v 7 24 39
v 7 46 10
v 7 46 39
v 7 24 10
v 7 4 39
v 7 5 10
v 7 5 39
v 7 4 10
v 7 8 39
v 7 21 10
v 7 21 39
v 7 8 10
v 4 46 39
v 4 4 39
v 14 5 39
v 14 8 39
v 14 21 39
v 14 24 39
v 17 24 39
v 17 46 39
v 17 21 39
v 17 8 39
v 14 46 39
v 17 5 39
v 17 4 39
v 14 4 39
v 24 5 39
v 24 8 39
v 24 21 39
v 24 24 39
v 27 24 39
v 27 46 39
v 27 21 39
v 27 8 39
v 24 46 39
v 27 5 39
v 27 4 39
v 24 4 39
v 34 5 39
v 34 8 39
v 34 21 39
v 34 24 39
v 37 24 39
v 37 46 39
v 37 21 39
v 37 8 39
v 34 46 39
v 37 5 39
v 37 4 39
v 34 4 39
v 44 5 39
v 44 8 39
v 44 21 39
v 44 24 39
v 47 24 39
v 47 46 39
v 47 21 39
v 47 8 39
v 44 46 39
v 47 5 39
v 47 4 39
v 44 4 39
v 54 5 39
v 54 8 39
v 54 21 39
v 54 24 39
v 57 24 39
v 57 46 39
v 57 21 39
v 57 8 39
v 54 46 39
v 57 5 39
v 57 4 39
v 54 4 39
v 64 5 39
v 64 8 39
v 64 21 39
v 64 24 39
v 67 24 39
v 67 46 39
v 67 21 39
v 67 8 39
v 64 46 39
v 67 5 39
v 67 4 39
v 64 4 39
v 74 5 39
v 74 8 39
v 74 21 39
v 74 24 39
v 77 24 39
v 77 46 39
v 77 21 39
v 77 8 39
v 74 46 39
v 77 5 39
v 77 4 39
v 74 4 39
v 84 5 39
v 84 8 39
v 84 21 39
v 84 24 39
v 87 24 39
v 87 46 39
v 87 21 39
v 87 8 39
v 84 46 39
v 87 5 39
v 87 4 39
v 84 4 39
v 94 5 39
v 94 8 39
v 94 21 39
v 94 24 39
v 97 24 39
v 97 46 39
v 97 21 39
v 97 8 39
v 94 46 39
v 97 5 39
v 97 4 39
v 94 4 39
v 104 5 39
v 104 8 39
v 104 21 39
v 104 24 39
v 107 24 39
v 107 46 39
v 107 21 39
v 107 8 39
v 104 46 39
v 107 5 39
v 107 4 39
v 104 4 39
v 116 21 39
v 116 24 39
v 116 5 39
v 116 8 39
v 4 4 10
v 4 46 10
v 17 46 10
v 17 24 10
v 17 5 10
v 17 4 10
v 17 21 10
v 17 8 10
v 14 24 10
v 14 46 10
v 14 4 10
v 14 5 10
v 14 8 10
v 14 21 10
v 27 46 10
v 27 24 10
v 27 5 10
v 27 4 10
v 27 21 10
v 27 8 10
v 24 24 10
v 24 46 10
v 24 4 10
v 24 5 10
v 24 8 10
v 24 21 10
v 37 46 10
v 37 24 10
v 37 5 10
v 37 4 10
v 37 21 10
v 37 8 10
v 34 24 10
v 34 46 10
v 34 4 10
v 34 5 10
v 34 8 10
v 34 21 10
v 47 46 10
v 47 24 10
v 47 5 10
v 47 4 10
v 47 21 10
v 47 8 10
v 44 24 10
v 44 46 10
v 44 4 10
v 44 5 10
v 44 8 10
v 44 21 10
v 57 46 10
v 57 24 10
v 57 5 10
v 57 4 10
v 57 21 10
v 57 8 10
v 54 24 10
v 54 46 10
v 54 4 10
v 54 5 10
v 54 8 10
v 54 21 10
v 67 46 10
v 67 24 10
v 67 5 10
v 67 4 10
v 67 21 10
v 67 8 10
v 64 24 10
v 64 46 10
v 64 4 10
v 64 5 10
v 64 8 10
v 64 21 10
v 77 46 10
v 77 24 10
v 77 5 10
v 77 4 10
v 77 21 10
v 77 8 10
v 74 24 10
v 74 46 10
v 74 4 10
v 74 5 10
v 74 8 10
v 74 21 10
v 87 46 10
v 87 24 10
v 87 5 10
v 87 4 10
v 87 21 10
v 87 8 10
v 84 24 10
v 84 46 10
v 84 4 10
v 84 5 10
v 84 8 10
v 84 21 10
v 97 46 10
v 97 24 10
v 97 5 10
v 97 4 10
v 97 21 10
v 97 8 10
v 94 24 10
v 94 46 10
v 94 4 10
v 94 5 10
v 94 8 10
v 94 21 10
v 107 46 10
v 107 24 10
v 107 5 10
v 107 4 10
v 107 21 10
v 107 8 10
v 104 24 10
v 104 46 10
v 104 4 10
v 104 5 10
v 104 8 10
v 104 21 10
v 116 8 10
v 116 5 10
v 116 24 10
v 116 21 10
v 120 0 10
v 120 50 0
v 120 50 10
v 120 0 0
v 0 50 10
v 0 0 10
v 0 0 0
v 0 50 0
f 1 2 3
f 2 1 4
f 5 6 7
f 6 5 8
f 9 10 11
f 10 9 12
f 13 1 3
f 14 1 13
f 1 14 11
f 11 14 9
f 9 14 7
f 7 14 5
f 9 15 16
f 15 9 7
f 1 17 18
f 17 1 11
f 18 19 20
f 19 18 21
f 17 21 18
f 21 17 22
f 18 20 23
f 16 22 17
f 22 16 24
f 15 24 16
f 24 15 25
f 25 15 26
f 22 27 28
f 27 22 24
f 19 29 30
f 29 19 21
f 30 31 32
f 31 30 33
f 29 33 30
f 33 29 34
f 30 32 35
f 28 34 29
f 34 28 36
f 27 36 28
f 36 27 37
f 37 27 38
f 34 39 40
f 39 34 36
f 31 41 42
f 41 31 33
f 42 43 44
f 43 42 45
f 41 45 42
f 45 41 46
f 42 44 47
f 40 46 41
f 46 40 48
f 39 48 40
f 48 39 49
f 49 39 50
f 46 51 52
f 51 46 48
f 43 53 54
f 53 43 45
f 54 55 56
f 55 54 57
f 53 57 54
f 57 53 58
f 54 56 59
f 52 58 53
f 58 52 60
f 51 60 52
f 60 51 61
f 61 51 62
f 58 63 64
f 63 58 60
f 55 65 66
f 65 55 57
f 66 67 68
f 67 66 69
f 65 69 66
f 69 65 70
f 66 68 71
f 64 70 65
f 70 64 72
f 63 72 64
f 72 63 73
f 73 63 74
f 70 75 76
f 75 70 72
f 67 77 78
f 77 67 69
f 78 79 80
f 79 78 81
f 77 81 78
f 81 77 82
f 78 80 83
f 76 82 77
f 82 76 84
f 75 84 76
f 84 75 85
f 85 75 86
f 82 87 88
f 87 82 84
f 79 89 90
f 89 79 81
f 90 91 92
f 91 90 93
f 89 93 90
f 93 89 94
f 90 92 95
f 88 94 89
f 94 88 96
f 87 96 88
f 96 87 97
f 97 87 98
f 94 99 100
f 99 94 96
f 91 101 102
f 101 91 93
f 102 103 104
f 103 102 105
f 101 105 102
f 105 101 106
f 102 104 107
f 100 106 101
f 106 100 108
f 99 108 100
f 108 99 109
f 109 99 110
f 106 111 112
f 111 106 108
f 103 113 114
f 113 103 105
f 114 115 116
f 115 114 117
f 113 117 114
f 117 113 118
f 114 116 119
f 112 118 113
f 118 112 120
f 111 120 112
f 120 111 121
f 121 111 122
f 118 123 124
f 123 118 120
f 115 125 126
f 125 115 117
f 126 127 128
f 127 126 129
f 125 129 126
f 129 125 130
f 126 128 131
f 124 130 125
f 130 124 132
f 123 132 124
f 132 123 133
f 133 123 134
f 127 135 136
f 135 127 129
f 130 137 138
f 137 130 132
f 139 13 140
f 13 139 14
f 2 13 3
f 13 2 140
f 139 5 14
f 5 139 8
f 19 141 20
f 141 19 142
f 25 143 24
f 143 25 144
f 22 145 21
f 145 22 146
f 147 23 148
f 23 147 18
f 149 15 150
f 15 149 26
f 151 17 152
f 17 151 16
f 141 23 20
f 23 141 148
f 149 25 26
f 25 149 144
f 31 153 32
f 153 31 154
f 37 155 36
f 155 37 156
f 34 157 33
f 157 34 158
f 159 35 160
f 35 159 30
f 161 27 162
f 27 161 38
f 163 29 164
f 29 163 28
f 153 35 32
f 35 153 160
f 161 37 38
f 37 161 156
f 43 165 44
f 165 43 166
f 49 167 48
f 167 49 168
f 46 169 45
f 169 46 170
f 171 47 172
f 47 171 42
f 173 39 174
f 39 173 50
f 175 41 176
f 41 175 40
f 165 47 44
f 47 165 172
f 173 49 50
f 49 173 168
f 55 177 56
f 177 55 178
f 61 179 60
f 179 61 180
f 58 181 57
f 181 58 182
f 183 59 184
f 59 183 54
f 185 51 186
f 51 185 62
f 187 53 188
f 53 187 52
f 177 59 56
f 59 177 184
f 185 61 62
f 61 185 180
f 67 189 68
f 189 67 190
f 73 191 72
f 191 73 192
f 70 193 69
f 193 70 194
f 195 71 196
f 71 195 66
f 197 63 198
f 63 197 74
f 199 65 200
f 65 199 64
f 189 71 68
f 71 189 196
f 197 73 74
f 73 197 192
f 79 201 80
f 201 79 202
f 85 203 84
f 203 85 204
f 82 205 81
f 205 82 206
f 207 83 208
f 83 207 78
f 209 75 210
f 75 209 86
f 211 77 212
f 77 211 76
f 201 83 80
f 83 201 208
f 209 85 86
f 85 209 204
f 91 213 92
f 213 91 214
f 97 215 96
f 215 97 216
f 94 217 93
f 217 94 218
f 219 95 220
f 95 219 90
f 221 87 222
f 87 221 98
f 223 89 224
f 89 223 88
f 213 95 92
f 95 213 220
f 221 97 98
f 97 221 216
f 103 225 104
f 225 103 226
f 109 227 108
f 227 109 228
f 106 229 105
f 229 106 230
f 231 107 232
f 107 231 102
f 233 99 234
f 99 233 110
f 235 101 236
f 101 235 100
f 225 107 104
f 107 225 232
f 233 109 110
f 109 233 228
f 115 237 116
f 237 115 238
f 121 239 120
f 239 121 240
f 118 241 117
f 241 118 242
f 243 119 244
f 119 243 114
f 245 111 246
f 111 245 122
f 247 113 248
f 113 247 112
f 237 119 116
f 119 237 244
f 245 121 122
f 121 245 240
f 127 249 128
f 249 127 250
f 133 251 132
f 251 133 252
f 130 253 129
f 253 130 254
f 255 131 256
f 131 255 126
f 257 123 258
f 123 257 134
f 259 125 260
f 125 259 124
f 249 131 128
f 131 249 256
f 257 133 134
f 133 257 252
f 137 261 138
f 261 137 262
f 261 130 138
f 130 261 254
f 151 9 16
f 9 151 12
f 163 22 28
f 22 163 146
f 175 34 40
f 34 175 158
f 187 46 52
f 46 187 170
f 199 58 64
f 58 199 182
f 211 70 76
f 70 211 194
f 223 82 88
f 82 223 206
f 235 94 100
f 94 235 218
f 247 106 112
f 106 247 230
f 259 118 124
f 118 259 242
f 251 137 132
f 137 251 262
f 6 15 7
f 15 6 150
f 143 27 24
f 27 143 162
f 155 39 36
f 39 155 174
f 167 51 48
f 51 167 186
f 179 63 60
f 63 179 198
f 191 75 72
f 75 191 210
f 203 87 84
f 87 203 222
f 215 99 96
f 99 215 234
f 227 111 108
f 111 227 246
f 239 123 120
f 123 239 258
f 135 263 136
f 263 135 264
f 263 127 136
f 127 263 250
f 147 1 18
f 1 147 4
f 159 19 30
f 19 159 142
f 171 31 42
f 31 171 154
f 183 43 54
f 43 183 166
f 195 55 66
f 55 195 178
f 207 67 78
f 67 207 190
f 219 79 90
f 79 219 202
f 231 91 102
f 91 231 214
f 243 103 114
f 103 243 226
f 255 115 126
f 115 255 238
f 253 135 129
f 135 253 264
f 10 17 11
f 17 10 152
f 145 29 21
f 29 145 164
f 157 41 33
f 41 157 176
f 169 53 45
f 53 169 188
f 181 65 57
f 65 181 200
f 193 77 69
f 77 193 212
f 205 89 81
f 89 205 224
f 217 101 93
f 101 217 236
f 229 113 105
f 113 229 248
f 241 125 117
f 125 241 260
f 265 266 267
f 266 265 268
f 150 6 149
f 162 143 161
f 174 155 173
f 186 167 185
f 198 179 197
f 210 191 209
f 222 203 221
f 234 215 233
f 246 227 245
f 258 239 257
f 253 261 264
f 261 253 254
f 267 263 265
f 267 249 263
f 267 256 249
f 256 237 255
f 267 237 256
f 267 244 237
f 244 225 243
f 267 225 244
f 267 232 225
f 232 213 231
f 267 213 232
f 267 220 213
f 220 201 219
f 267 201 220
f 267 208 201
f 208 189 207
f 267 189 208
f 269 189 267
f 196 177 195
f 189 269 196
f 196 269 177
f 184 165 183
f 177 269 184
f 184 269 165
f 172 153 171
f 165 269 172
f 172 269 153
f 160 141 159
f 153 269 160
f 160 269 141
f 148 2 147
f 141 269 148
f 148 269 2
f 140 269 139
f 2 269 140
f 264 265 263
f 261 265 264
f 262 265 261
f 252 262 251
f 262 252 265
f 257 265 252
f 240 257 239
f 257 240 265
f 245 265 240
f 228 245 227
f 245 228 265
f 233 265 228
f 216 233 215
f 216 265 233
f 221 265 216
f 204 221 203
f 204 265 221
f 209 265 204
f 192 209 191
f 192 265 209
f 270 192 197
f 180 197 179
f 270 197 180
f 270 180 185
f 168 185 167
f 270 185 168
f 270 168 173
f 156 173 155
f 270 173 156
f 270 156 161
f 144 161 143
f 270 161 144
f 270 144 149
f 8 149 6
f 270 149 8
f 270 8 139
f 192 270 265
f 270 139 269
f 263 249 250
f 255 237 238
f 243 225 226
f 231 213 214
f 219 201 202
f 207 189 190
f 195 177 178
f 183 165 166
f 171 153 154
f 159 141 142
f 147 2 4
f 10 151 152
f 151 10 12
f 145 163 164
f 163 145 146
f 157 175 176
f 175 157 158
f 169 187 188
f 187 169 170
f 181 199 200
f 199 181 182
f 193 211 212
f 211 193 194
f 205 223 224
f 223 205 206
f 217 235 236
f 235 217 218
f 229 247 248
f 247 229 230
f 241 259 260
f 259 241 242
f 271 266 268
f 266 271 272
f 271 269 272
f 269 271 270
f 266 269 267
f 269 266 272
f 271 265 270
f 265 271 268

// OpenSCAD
$fn = 32;

// ----------------------------------------------------------------------
// Heatsink: cross fin block
// ----------------------------------------------------------------------

// --- parameters (mm) ---
base_l = 120;             // base length, X
base_w = 50;              // base width, Y
base_t = 10;              // base plate thickness
fin_h = 30;               // fin height above the base
fin_t = 3;                // fin thickness
edge = 4;                 // margin from the base ends
pitch = 10;               // fin pitch
rib_pitch = 16;           // cross rib pitch
fit_tol = 0.1;            // tolerance for press fits, mm
free_tol = 0.3;           // tolerance for clearance fits, mm

n_fins = floor((base_l - 2 * edge - fin_t) / pitch) + 1;  // fin count
total_h = base_t + fin_h - 1;  // overall height
n_ribs = floor((base_w - 2 * edge) / rib_pitch);  // rib count

union() {
  cube([base_l, base_w, base_t]);
  for (i = [0 : n_fins - 1])
    translate([edge + i * pitch, edge, base_t - 1])
      cube([fin_t, base_w - 2 * edge, fin_h]);
  for (i = [0 : n_ribs - 1])
    translate([edge, edge + 1 + i * rib_pitch, base_t - 1])
      cube([base_l - 2 * edge, fin_t, fin_h]);
}
